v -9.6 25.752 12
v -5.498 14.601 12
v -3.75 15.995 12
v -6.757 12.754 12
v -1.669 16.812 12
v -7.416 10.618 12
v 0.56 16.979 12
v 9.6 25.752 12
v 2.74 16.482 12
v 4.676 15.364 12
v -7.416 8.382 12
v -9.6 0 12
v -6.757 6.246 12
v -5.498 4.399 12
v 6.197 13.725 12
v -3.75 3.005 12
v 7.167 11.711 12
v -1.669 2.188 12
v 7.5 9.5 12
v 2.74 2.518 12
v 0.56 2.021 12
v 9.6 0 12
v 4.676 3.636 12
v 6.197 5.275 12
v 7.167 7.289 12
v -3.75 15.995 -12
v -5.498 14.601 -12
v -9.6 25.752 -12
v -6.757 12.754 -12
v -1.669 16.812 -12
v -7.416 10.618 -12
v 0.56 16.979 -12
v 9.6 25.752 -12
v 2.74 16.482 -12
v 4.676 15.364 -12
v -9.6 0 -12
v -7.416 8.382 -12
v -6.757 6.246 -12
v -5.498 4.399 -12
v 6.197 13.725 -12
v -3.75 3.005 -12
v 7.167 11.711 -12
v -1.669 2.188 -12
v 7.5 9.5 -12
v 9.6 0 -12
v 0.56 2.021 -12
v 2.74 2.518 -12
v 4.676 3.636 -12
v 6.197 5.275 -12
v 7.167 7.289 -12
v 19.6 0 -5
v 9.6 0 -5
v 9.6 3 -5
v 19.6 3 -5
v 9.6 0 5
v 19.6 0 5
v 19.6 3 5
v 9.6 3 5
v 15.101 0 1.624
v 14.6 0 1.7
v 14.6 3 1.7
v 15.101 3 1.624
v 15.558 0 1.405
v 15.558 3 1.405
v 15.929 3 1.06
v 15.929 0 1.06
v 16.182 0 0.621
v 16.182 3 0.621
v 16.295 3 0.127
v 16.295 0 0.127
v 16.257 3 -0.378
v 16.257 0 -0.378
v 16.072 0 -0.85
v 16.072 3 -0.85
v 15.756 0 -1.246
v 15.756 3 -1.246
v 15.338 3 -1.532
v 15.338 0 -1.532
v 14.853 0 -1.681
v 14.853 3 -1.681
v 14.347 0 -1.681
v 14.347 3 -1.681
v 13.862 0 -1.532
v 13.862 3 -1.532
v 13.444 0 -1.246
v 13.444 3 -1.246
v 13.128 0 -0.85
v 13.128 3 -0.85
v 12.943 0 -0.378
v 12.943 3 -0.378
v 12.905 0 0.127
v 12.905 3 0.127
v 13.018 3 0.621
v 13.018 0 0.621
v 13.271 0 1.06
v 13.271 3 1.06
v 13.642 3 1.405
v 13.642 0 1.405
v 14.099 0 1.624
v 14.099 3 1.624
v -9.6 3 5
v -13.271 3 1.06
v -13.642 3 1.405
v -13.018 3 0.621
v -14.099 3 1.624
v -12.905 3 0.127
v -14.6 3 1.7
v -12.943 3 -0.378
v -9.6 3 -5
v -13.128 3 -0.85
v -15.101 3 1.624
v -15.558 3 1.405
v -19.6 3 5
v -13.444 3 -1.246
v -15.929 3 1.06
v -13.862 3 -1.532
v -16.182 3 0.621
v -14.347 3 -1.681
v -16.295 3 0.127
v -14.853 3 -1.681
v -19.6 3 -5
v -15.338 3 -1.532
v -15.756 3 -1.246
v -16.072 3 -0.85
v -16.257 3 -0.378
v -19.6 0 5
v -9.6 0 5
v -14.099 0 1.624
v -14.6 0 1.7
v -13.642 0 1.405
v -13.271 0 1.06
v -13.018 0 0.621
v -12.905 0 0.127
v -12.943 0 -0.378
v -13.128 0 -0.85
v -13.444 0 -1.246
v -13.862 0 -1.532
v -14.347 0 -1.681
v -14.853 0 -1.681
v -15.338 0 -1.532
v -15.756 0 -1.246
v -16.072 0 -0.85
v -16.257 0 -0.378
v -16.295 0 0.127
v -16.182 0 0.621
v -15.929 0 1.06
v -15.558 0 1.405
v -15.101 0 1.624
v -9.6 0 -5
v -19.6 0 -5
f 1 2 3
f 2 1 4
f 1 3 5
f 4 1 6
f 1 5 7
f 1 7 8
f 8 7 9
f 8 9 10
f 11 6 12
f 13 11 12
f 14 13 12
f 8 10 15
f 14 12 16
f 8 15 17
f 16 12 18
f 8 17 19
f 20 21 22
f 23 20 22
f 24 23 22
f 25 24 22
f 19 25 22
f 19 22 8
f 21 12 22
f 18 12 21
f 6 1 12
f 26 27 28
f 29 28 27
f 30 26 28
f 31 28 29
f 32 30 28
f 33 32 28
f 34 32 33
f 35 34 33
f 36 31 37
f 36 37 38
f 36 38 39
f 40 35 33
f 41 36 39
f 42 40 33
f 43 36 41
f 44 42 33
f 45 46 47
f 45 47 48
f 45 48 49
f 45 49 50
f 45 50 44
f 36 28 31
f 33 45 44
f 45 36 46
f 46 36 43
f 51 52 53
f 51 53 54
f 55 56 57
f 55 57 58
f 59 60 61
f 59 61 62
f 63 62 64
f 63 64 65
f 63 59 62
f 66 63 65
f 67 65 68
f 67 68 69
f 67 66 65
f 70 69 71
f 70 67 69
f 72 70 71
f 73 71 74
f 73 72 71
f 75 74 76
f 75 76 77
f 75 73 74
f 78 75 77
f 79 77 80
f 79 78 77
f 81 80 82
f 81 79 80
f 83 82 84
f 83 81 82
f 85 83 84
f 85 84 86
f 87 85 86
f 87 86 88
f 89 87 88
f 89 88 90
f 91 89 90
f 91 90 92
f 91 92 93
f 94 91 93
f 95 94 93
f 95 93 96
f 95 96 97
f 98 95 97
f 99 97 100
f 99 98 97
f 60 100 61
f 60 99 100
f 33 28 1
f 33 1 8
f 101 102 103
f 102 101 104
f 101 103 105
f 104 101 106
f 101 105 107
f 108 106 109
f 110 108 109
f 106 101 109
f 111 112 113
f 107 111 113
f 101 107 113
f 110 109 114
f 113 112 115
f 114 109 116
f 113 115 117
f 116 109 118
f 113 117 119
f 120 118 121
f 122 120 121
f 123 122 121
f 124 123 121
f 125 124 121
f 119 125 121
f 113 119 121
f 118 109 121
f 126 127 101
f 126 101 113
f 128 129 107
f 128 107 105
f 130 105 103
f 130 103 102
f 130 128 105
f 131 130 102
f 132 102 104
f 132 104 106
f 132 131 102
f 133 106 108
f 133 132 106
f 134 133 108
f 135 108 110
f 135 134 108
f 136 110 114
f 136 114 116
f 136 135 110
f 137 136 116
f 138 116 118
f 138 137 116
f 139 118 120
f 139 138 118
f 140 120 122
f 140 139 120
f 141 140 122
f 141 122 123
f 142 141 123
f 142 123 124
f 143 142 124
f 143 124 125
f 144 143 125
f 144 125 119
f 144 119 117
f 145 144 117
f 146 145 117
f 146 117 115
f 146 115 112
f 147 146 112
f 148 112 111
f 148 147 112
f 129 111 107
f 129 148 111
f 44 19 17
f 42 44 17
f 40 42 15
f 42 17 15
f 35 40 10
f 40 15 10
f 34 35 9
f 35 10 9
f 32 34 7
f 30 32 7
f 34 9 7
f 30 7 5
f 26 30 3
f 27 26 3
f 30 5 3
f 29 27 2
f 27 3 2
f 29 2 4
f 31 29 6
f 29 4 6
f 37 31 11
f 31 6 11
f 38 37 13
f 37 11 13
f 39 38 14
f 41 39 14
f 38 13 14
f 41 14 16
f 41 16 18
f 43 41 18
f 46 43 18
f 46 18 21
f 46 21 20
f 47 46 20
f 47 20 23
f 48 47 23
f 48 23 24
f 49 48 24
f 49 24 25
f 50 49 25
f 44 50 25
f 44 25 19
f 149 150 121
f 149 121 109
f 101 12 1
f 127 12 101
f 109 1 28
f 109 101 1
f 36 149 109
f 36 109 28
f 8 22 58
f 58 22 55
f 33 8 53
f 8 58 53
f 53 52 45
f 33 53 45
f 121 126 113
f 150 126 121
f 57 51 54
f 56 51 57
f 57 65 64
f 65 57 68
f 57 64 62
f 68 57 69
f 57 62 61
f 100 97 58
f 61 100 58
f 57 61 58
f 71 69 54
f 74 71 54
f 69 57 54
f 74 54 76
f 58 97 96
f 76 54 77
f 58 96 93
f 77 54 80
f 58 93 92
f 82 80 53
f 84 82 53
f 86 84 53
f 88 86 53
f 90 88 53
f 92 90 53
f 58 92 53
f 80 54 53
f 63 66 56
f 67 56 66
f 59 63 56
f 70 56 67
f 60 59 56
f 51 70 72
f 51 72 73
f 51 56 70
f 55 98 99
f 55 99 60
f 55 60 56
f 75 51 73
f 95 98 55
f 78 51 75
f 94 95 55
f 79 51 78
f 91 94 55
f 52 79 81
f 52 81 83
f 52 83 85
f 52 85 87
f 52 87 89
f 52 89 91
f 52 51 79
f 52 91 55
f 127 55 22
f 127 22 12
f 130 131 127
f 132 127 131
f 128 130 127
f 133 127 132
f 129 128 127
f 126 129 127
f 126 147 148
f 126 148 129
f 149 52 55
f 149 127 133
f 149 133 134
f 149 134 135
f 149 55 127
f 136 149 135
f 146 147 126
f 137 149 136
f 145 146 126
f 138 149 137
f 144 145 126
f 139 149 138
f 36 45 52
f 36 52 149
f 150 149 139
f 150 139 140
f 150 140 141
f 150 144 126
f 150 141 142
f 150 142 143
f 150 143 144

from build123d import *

# Parameters (mm, degrees)
SKETCH1_R           = 1.7
BOSS_EXTRUDE1_DEPTH = 3
SKETCH2_W           = 19.2
SKETCH2_H           = 24
BOSS_EXTRUDE2_DEPTH = 22.752
SKETCH3_R           = 7.5
CUT_EXTRUDE1_DEPTH  = 41.290513821


with BuildPart() as part:
    # Sketch1 → Boss-Extrude1 (new body)
    with BuildSketch(Plane(origin=(0, 0, 0), x_dir=(1, 0, 0), z_dir=(0, 1, 0))):
        Polygon((-9.6, 5), (-9.6, 12), (9.6, 12), (9.6, 5), (19.6, 5), (19.6, -5), (9.6, -5), (9.6, -12), (-9.6, -12), (-9.6, -5), (-19.6, -5), (-19.6, 5), align=None)
        with Locations(Location((-14.6, 0, 0), (0, 0, 270))):
            Circle(SKETCH1_R, mode=Mode.SUBTRACT)
        with Locations(Location((14.6, 0, 0), (0, 0, 270))):
            Circle(SKETCH1_R, mode=Mode.SUBTRACT)
    extrude(amount=BOSS_EXTRUDE1_DEPTH)

    # Sketch2 → Boss-Extrude2 (add)
    with BuildSketch(Plane(origin=(0, 3, 0), x_dir=(1, 0, 0), z_dir=(0, 1, 0))):
        Rectangle(SKETCH2_W, SKETCH2_H)
    extrude(amount=BOSS_EXTRUDE2_DEPTH)

    # Sketch3 → Cut-Extrude1 (cut, through all)
    with BuildSketch(Plane.XY.offset(12)):
        with Locations((0, 9.5)):
            Circle(SKETCH3_R)
    extrude(amount=-CUT_EXTRUDE1_DEPTH, mode=Mode.SUBTRACT)


solid = part.part
